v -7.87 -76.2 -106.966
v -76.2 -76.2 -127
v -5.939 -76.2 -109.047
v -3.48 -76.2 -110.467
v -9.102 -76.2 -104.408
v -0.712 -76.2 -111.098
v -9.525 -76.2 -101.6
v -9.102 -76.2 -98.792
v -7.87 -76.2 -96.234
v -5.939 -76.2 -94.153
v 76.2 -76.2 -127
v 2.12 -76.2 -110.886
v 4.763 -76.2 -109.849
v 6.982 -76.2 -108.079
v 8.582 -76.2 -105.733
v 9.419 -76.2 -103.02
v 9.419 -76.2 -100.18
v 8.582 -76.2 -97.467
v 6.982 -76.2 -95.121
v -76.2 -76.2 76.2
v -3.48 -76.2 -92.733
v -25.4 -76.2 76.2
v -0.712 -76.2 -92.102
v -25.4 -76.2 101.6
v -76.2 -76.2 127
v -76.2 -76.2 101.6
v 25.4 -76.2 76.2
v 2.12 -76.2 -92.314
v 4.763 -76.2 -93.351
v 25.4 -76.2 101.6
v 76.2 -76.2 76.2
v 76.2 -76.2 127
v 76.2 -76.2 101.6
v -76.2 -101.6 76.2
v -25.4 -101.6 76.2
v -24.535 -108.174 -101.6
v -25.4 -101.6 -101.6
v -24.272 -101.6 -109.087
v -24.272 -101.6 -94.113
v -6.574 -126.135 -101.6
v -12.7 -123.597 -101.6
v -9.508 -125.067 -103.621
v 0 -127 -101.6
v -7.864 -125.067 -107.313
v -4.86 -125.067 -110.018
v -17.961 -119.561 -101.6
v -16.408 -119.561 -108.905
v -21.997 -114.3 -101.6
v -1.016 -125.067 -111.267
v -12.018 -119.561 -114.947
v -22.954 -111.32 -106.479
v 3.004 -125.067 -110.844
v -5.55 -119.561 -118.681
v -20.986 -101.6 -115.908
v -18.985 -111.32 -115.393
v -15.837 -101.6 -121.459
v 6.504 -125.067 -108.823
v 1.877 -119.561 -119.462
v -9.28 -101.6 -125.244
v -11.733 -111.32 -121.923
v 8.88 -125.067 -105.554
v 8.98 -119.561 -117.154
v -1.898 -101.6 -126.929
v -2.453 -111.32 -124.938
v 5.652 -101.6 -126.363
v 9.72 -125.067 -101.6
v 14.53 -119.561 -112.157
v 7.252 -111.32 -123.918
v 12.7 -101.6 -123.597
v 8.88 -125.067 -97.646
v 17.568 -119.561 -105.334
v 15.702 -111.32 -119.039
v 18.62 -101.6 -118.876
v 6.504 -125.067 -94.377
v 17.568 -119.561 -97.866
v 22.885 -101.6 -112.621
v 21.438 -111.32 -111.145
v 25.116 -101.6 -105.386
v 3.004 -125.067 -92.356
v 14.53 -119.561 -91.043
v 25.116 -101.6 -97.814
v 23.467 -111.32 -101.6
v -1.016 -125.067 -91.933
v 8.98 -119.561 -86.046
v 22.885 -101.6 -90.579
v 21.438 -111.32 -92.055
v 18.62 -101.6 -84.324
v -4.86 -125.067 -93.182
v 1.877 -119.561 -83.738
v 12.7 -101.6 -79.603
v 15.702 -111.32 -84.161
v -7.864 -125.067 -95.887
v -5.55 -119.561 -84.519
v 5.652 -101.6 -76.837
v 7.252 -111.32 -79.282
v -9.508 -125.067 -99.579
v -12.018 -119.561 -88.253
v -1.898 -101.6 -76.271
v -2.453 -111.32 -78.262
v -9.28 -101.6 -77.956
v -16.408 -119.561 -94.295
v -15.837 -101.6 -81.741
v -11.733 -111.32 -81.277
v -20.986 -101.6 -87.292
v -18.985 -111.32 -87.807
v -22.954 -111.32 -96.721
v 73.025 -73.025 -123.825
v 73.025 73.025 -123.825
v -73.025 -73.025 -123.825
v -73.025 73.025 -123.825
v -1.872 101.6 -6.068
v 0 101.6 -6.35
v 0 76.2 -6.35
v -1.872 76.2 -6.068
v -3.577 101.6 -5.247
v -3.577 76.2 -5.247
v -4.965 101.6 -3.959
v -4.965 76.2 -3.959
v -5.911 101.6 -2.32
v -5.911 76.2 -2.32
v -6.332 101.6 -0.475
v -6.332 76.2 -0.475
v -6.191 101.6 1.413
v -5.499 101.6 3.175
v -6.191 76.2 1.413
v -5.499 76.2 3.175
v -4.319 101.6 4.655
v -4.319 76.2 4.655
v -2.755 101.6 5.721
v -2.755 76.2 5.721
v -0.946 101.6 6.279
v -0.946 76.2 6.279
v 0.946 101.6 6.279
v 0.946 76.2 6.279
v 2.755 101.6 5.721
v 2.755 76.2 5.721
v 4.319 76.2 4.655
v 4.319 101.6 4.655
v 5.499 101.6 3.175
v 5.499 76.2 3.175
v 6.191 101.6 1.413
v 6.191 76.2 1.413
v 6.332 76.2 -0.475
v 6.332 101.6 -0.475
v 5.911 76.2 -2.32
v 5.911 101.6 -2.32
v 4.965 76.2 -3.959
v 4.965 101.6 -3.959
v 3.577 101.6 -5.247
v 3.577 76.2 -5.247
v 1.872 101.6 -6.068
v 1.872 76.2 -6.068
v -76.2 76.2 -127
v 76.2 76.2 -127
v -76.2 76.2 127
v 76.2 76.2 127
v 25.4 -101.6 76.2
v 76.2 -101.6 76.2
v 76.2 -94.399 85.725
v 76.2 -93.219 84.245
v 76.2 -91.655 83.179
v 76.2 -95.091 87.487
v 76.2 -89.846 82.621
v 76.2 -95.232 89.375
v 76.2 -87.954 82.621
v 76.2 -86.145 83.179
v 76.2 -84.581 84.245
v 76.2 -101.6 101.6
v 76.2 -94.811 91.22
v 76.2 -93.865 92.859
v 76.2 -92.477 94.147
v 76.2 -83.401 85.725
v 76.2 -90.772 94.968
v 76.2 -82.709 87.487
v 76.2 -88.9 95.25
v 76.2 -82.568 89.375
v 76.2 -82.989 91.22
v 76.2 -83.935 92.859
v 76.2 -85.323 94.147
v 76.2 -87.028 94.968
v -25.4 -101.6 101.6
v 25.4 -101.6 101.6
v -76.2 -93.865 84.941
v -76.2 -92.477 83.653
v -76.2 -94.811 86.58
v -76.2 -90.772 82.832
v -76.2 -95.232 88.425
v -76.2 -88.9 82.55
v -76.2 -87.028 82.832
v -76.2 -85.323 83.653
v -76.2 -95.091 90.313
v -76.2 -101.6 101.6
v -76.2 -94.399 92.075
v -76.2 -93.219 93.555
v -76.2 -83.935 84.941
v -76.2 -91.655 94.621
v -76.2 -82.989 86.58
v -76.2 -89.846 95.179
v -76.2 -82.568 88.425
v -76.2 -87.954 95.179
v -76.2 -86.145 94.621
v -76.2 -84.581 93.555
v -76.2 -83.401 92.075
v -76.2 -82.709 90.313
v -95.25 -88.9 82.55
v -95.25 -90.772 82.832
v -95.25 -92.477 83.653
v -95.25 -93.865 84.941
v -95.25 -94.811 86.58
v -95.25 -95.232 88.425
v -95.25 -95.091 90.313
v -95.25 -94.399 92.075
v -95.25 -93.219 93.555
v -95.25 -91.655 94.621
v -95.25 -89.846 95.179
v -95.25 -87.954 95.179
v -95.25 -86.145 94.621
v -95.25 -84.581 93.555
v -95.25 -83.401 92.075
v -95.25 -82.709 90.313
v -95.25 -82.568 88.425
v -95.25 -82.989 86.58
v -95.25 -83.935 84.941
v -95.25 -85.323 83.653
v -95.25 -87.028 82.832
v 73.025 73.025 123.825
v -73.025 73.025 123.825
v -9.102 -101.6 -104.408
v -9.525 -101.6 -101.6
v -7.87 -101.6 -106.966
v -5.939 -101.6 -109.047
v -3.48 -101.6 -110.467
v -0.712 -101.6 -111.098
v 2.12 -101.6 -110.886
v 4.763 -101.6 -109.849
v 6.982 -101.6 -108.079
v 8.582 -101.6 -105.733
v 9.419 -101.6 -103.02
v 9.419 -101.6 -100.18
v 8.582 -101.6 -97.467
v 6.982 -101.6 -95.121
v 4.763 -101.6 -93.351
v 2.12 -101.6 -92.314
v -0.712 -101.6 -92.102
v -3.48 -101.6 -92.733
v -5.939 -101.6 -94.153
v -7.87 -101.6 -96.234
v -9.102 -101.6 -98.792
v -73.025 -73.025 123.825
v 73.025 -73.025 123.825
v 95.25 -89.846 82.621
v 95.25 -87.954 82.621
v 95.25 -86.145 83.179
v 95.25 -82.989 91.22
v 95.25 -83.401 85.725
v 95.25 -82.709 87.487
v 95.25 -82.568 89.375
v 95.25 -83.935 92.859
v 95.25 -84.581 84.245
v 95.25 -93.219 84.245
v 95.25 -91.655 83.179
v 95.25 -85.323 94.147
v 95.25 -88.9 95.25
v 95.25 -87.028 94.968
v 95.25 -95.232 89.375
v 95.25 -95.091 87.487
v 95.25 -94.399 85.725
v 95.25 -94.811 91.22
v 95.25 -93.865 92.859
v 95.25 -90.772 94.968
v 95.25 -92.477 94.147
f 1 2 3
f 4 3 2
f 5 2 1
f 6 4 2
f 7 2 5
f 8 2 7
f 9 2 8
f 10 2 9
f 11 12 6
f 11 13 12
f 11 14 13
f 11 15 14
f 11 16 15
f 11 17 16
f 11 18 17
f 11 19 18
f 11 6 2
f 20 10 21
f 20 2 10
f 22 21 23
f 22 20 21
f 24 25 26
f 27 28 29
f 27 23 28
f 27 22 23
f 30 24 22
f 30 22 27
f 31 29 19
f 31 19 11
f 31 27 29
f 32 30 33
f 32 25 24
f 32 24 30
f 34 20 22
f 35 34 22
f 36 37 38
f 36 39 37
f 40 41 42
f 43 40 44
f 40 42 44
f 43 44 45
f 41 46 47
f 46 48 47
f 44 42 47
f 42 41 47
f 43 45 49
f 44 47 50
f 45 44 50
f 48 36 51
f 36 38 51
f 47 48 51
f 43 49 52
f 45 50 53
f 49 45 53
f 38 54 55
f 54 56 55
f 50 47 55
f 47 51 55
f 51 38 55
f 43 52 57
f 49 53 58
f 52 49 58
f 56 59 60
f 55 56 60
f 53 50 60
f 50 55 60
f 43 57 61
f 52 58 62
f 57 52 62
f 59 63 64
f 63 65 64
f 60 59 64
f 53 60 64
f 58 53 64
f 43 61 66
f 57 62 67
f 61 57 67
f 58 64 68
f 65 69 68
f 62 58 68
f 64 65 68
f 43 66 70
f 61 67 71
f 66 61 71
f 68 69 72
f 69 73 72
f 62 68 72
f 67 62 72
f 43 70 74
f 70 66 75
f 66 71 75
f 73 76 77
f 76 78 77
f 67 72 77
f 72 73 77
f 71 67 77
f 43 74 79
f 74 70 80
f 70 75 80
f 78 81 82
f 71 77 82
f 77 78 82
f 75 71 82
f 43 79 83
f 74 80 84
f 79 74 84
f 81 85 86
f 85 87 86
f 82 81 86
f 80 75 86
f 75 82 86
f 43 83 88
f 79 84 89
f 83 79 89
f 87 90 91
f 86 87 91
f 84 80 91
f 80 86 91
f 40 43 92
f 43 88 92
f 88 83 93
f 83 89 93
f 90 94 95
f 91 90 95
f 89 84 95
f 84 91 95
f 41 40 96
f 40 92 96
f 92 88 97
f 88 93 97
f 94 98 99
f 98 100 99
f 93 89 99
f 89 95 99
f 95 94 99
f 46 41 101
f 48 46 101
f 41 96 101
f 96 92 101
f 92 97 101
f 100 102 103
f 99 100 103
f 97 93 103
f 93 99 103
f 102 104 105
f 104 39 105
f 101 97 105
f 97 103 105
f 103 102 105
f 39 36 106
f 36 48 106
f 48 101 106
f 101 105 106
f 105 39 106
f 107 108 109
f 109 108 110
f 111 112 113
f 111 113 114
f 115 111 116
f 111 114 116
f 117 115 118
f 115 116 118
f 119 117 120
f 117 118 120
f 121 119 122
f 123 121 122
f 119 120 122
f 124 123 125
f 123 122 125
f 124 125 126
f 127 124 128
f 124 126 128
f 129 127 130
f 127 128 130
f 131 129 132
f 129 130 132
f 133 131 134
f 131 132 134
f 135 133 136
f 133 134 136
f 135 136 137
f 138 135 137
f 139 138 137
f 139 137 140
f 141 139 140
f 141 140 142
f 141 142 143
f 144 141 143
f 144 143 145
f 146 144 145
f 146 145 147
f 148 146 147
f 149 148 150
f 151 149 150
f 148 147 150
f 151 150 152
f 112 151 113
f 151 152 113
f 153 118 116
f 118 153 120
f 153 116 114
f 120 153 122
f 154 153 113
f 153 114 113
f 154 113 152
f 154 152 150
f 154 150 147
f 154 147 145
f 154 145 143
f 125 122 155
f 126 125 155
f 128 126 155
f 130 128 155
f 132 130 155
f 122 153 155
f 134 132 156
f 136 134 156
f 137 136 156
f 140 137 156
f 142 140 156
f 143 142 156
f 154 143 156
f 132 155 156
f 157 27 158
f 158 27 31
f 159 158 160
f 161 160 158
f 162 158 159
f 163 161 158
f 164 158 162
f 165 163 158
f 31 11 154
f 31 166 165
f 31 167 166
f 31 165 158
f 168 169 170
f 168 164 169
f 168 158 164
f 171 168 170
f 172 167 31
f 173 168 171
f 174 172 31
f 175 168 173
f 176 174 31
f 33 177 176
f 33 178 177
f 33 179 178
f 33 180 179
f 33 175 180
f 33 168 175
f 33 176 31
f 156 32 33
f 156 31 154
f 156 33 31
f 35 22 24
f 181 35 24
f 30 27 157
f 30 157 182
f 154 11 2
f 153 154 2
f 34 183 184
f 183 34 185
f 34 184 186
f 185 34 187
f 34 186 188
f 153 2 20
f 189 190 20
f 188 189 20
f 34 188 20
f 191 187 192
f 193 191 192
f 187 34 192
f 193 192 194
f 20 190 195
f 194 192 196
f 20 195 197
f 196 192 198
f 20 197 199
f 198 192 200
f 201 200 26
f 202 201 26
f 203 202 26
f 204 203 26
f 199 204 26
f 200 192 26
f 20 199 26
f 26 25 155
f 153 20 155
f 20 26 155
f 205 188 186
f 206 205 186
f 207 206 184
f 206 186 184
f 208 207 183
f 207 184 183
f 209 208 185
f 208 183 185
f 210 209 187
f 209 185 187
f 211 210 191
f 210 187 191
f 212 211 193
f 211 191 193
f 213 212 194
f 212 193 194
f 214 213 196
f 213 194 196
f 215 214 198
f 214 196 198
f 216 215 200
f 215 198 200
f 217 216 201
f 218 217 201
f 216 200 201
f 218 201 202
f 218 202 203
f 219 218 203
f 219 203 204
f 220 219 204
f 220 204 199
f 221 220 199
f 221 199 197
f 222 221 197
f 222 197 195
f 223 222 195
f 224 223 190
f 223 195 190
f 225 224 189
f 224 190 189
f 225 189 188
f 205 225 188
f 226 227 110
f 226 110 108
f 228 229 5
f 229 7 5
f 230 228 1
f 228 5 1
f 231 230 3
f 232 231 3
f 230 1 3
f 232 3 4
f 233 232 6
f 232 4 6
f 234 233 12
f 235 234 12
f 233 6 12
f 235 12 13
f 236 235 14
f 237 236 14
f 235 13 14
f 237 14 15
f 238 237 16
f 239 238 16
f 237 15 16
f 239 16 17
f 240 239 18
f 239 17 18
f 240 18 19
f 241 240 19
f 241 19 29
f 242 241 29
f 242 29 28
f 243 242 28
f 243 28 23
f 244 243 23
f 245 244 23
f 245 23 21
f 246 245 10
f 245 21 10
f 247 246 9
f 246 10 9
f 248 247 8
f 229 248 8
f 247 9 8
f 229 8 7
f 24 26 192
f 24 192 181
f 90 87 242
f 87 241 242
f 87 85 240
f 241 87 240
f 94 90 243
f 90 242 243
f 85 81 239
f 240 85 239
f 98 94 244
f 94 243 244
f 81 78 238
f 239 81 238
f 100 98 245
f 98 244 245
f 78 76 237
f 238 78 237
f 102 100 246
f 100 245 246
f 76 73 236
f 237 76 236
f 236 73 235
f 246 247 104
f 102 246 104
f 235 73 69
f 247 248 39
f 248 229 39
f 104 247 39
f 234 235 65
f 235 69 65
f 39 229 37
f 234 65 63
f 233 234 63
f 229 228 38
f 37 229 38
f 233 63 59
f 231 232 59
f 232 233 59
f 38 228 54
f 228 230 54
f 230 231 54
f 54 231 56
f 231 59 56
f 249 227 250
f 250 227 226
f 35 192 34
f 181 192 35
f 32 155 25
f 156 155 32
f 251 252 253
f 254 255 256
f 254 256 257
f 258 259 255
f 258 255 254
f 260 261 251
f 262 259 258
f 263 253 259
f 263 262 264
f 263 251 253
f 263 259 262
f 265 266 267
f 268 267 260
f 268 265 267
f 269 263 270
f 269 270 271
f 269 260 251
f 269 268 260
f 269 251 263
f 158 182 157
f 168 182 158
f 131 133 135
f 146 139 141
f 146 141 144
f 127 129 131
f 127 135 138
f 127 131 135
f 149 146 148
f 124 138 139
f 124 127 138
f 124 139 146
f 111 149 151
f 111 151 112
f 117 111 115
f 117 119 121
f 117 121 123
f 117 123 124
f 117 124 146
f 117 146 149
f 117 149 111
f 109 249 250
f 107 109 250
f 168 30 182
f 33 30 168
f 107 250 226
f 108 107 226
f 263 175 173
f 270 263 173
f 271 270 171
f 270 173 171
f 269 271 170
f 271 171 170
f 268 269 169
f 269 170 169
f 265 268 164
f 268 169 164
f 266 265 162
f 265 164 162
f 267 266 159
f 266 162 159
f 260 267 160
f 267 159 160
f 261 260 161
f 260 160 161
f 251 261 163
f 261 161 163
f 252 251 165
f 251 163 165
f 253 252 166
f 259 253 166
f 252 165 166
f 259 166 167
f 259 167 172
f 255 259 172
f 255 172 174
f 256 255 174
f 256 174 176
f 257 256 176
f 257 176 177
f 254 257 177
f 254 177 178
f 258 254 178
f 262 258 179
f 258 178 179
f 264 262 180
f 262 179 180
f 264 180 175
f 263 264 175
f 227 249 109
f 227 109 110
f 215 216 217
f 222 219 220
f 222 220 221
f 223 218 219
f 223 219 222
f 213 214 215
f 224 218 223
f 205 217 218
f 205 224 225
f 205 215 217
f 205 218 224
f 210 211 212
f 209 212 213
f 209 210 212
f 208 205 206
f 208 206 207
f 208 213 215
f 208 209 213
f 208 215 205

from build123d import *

# Parameters (mm, degrees)
SKETCH1_W             = 152.4
SKETCH1_H             = 152.4
SKETCH1_W_2           = 146.05
SKETCH1_H_2           = 146.05
BOSS_EXTRUDE1_DEPTH   = 127
SKETCH2_W             = 146.05
SKETCH2_H             = 146.05
BOSS_EXTRUDE2_DEPTH   = 3.175
SKETCH3_W             = 146.05
SKETCH3_H             = 146.05
BOSS_EXTRUDE3_DEPTH   = 3.175
SKETCH4_W             = 50.8
SKETCH4_H             = 25.4
BOSS_EXTRUDE4_DEPTH   = 25.4
BOSS_EXTRUDE4_2_DEPTH = 25.4
SKETCH7_R             = 6.35
BOSS_EXTRUDE5_DEPTH   = 25.4
SKETCH8_R             = 6.35
BOSS_EXTRUDE6_DEPTH   = 19.05
SKETCH9_R             = 6.35
BOSS_EXTRUDE7_DEPTH   = 19.05


with BuildPart() as part:
    # Sketch1 → Boss-Extrude1 (new, symmetric)
    with BuildSketch(Plane.XY):
        Rectangle(SKETCH1_W, SKETCH1_H)
        Rectangle(SKETCH1_W_2, SKETCH1_H_2, mode=Mode.SUBTRACT)
    extrude(amount=BOSS_EXTRUDE1_DEPTH, both=True)

    # Sketch2 → Boss-Extrude2 (add)
    with BuildSketch(Plane.XY.offset(127)):
        Rectangle(SKETCH2_W, SKETCH2_H)
    extrude(amount=-BOSS_EXTRUDE2_DEPTH)

    # Sketch3 → Boss-Extrude3 (add)
    with BuildSketch(Plane(origin=(0, 0, -127), x_dir=(-1, 0, 0), z_dir=(0, 0, -1))):
        Rectangle(SKETCH3_W, SKETCH3_H)
    extrude(amount=-BOSS_EXTRUDE3_DEPTH)

    # Sketch6 → Revolve2 (revolve)
    with BuildSketch(Plane(origin=(0, 0, -101.6), x_dir=(-1, 0, 0), z_dir=(0, 0, -1))):
        with BuildLine():
            Line((0, -76.2), (0, -127))
            ThreePointArc((0, -127), (17.960512242, -119.560512242), (25.4, -101.6))
            Line((25.4, -101.6), (9.525, -101.6))
            Line((9.525, -101.6), (9.525, -76.2))
            Line((9.525, -76.2), (0, -76.2))
        make_face()
    revolve(axis=Axis((0, -76.2, -101.6), (0, -1, 0)))

    # Sketch7 → Boss-Extrude5 (add)
    with BuildSketch(Plane(origin=(0, 76.2, 0), x_dir=(1, 0, 0), z_dir=(0, 1, 0))):
        with Locations(Location((0, 0, 0), (0, 0, 90))):
            Circle(SKETCH7_R)
    extrude(amount=BOSS_EXTRUDE5_DEPTH)


with BuildPart() as body_2:
    # Sketch4 → Boss-Extrude4 (new body)
    with BuildSketch(Plane.XZ.offset(76.2)):
        with Locations((50.8, 88.9)):
            Rectangle(SKETCH4_W, SKETCH4_H)
    extrude(amount=BOSS_EXTRUDE4_DEPTH)


    add(part.part)  # Boss-Extrude6 merges part
    # Sketch8 → Boss-Extrude6 (add)
    with BuildSketch(Plane(origin=(76.2, 0, 0), x_dir=(0, 0, -1), z_dir=(1, 0, 0))):
        with Locations(Location((-88.9, -88.9, 0), (0, 0, 180))):
            Circle(SKETCH8_R)
    extrude(amount=BOSS_EXTRUDE6_DEPTH)


with BuildPart() as body_3:
    # Sketch4 → Boss-Extrude4 2 (new body)
    with BuildSketch(Plane.XZ.offset(76.2)):
        with Locations((-50.8, 88.9)):
            Rectangle(SKETCH4_W, SKETCH4_H)
    extrude(amount=BOSS_EXTRUDE4_2_DEPTH)


    add(body_2.part)  # Boss-Extrude7 merges body 2
    # Sketch9 → Boss-Extrude7 (add)
    with BuildSketch(Plane.ZY.offset(76.2)):
        with Locations(Location((88.9, -88.9, 0), (0, 0, 180))):
            Circle(SKETCH9_R)
    extrude(amount=BOSS_EXTRUDE7_DEPTH)


solid = body_3.part
